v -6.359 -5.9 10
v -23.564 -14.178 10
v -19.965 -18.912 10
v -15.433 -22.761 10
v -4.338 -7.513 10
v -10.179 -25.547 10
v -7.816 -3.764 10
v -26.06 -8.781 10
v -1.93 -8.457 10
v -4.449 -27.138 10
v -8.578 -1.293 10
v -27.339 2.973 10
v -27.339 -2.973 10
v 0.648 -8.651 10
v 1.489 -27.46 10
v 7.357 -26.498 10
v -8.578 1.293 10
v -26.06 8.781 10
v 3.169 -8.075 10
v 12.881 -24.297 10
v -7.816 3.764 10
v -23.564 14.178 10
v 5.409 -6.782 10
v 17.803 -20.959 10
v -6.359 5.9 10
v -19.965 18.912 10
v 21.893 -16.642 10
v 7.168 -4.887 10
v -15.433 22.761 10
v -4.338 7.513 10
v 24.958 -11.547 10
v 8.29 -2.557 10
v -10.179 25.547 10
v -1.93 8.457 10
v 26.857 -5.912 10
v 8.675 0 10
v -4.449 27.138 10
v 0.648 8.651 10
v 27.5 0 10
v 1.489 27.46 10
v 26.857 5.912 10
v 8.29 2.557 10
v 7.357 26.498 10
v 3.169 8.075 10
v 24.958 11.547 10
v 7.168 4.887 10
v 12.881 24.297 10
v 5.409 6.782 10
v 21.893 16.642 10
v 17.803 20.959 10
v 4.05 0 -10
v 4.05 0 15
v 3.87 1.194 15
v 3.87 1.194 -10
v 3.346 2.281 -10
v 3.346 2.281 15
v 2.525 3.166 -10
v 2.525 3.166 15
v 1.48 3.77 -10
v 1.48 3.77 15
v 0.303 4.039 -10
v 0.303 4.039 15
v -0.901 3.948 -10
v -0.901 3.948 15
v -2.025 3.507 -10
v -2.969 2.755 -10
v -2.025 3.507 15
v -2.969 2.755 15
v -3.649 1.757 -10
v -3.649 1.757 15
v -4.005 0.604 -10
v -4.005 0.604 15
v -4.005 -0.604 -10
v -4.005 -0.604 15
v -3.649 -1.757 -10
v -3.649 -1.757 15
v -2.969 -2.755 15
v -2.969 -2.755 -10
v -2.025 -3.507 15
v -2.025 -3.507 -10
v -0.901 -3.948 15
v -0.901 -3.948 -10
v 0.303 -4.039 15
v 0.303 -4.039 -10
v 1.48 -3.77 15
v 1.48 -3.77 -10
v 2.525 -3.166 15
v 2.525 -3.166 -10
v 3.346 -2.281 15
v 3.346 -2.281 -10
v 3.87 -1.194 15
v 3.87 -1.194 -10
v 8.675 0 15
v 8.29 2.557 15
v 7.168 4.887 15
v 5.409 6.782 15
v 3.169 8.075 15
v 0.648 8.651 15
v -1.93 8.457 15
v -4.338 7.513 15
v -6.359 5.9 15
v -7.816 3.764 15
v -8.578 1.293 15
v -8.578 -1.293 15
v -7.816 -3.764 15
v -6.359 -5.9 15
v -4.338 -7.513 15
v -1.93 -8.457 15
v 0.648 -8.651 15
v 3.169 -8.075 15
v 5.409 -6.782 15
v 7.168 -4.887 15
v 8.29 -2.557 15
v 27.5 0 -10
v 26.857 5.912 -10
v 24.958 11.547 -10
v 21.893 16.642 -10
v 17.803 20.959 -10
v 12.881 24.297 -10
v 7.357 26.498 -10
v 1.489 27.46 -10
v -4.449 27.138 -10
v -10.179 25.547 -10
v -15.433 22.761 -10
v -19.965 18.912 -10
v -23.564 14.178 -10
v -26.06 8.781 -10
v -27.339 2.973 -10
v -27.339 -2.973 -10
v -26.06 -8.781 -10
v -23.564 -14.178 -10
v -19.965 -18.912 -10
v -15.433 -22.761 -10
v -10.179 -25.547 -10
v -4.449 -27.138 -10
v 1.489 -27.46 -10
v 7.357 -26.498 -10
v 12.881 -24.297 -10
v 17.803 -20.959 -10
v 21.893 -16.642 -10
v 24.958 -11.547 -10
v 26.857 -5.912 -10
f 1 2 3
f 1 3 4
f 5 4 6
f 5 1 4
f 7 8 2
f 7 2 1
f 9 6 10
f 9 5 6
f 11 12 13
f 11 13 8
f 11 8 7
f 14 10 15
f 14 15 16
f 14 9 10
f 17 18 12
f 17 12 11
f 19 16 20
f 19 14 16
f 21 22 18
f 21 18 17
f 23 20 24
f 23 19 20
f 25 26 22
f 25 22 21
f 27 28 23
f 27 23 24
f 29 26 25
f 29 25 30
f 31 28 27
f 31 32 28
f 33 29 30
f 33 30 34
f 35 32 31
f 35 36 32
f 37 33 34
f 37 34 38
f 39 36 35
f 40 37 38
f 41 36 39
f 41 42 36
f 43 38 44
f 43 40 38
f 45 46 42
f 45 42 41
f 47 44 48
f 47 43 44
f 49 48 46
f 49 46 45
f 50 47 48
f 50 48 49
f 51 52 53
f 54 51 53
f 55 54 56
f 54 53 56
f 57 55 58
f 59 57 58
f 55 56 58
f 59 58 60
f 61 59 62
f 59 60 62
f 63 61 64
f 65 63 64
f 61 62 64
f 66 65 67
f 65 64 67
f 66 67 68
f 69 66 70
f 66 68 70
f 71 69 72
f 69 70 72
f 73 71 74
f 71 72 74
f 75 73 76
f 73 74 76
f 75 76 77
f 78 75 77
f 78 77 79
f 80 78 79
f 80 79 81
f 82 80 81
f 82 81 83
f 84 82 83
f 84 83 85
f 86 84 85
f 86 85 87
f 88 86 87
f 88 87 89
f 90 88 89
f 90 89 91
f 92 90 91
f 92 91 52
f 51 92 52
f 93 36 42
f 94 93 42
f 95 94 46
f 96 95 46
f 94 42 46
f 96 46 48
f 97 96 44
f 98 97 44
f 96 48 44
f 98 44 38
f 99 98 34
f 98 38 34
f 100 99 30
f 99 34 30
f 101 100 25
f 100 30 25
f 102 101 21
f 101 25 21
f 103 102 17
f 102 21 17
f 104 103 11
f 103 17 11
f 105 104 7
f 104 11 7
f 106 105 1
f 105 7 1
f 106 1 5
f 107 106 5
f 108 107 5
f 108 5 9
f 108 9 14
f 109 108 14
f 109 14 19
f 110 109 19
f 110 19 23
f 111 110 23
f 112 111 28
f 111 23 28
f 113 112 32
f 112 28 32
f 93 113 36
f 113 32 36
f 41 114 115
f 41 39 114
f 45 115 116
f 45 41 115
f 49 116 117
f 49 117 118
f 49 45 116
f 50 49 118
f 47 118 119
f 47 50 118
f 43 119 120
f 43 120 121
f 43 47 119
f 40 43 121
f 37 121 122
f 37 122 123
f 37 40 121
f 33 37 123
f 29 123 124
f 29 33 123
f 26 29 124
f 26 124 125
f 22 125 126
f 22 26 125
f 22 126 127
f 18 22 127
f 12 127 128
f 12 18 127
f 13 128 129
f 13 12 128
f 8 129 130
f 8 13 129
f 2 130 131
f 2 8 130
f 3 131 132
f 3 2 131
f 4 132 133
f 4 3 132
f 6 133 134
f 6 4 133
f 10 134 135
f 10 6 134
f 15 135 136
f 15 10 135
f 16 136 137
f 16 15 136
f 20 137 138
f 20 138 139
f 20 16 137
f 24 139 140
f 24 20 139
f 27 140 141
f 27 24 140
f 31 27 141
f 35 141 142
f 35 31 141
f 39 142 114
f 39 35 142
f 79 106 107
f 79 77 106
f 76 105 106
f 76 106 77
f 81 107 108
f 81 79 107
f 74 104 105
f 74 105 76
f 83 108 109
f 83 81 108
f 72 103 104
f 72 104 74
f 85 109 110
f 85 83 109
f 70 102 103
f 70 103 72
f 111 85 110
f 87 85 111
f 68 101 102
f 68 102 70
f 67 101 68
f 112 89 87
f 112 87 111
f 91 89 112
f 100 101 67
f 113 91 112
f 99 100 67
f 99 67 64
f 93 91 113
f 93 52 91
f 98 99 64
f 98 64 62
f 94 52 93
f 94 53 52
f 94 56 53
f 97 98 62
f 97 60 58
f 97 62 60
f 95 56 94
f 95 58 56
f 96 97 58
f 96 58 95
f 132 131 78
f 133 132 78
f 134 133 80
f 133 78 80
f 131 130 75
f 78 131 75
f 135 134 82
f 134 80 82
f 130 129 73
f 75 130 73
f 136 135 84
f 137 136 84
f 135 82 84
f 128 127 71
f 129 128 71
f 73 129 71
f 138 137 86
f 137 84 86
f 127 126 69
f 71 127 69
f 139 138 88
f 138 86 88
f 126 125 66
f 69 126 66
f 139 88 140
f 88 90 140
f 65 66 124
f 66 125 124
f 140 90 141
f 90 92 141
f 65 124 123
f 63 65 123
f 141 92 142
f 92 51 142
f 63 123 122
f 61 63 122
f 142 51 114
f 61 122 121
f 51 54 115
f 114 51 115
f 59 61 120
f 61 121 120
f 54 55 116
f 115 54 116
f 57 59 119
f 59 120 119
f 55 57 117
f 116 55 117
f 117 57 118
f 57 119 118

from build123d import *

# Parameters (mm, degrees)
CROQUIS1_R              = 27.5
SALIENTE_EXTRUIR1_DEPTH = 10
CROQUIS4_R              = 4.05
CORTAR_EXTRUIR2_DEPTH   = 108
CROQUIS5_R              = 8.675
SALIENTE_EXTRUIR2_DEPTH = 5
CROQUIS6_R              = 4.05
CORTAR_EXTRUIR3_DEPTH   = 122


with BuildPart() as part:
    # Croquis1 → Saliente-Extruir1 (new, symmetric)
    with BuildSketch(Plane.XY):
        Circle(CROQUIS1_R)
    extrude(amount=SALIENTE_EXTRUIR1_DEPTH, both=True)

    # Croquis4 → Cortar-Extruir2 (cut)
    with BuildSketch(Plane.XY.offset(10)):
        Circle(CROQUIS4_R)
    extrude(amount=-CORTAR_EXTRUIR2_DEPTH, mode=Mode.SUBTRACT)

    # Croquis5 → Saliente-Extruir2 (add)
    with BuildSketch(Plane.XY.offset(10)):
        Circle(CROQUIS5_R)
    extrude(amount=SALIENTE_EXTRUIR2_DEPTH)

    # Croquis6 → Cortar-Extruir3 (cut, symmetric)
    with BuildSketch(Plane.XY.offset(15)):
        Circle(CROQUIS6_R)
    extrude(amount=CORTAR_EXTRUIR3_DEPTH, both=True, mode=Mode.SUBTRACT)


solid = part.part
